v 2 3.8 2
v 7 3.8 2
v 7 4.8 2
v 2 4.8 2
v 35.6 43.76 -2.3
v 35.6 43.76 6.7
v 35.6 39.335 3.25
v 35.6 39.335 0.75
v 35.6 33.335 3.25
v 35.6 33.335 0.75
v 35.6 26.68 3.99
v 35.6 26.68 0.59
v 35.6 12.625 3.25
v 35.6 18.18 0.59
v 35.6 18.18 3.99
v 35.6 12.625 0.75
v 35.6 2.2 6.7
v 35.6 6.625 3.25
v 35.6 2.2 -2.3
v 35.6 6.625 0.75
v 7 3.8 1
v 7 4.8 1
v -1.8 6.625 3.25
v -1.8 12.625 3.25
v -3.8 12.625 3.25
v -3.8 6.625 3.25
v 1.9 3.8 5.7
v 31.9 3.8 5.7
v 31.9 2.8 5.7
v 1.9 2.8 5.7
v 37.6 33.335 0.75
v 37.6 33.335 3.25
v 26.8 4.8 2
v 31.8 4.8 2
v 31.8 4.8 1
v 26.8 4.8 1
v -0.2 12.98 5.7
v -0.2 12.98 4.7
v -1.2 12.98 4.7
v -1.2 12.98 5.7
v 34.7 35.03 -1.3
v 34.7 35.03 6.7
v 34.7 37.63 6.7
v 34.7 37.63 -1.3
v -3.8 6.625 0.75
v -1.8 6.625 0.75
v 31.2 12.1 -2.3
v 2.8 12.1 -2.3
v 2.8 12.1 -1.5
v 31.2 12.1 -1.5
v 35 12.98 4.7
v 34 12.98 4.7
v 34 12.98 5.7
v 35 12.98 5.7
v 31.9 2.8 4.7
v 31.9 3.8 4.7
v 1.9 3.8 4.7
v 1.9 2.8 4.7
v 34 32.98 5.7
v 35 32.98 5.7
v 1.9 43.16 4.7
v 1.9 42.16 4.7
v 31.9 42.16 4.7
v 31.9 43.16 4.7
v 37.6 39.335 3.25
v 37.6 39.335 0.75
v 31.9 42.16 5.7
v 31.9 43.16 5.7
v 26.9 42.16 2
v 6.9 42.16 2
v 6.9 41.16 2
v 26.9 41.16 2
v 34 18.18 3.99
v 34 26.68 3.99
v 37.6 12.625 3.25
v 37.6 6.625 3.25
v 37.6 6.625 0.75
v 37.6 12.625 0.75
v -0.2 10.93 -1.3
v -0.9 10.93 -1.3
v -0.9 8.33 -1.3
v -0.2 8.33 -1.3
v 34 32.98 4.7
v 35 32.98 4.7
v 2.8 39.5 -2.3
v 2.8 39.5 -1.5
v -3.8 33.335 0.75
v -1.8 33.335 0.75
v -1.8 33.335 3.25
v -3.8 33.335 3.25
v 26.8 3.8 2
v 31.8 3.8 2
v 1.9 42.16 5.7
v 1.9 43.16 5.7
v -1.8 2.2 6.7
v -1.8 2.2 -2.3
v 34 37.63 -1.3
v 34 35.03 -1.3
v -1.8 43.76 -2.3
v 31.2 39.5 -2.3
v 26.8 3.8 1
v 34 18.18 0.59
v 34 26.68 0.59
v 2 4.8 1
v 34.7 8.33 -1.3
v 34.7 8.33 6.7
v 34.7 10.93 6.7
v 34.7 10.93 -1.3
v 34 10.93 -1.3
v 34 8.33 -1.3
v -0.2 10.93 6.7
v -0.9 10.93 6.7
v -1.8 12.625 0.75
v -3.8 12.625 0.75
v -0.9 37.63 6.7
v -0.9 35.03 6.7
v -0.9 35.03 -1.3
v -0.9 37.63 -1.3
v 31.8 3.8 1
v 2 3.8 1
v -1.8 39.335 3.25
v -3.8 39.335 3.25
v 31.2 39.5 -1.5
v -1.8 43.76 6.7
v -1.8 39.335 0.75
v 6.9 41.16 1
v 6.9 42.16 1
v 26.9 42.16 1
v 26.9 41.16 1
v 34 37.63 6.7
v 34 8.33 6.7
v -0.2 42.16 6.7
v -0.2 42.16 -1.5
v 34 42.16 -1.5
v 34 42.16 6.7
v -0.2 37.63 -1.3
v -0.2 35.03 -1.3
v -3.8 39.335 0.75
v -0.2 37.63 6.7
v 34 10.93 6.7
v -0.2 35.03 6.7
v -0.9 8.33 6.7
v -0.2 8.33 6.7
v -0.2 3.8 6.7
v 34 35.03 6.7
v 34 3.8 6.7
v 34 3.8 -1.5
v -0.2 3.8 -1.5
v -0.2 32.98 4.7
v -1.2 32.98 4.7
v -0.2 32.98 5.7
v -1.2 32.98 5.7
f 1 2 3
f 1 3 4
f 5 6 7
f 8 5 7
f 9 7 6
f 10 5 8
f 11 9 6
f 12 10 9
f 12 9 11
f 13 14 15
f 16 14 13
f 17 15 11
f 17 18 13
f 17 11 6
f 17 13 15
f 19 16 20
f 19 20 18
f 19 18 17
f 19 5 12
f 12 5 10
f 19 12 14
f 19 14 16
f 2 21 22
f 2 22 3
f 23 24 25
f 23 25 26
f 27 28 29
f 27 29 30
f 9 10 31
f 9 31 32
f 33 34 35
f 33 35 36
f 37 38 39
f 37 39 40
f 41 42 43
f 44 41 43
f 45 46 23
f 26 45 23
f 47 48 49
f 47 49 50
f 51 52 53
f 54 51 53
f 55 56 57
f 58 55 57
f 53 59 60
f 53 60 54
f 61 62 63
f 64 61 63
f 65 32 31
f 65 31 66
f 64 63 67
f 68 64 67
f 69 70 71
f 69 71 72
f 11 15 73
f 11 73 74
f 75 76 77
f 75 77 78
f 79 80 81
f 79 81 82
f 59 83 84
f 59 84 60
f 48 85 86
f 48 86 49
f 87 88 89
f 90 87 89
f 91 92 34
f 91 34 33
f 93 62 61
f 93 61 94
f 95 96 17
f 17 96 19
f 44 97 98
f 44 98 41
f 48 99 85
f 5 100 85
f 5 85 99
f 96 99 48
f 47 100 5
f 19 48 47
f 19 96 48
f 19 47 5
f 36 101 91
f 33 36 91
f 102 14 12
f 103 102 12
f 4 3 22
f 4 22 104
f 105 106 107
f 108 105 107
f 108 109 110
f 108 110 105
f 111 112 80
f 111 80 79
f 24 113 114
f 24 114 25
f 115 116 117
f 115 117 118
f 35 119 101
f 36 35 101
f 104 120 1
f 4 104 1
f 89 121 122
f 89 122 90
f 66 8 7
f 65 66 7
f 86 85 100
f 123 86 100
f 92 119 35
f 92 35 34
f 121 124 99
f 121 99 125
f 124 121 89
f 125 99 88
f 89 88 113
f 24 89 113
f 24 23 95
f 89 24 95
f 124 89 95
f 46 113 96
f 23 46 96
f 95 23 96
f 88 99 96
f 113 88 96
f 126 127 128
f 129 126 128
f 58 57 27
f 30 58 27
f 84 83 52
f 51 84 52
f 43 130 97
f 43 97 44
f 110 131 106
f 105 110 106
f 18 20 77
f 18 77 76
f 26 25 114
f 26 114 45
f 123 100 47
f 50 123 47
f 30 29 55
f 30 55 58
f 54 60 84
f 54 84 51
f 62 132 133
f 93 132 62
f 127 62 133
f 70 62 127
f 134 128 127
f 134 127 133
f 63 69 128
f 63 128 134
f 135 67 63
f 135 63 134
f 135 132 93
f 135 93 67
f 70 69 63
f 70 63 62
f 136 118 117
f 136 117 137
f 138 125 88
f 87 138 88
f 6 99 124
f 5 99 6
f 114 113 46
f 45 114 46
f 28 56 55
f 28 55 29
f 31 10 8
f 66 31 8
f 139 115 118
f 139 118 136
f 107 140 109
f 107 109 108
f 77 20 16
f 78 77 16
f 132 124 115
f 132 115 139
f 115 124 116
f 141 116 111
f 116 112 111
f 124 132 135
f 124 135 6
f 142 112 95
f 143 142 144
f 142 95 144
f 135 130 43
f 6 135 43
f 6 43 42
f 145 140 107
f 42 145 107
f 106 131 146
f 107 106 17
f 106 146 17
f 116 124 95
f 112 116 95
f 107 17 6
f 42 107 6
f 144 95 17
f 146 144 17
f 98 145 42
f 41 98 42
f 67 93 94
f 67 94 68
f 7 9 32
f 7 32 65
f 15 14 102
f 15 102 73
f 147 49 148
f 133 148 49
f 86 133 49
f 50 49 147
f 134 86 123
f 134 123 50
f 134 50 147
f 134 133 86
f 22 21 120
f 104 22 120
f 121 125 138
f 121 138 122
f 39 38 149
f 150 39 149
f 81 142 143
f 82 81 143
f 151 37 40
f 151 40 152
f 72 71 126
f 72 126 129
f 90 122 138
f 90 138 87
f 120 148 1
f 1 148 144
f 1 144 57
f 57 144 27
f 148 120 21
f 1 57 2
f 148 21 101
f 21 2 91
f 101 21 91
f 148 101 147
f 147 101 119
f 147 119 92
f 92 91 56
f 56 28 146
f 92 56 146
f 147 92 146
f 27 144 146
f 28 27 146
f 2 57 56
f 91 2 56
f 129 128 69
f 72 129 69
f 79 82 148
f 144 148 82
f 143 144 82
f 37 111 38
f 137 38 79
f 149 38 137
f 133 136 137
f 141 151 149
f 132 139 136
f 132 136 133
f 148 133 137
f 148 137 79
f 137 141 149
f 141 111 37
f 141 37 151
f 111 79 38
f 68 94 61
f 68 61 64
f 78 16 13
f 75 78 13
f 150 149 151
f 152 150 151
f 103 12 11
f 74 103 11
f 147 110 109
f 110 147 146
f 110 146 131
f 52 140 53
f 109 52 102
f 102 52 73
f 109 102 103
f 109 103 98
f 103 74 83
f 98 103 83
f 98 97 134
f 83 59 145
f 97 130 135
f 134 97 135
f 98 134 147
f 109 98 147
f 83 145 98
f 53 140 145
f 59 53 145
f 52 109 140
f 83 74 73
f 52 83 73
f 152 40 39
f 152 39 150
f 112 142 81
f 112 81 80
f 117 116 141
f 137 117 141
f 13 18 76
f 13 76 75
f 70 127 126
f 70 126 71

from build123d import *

# Parameters (mm, degrees)
SKETCH030_W     = 37.4
SKETCH030_H     = 41.56
PAD023_DEPTH    = 9
SKETCH031_W     = 28.4
SKETCH031_H     = 27.4
POCKET016_DEPTH = 0.8
SKETCH032_W     = 34.2
SKETCH032_H     = 38.36
POCKET017_DEPTH = 8.2
SKETCH033_W     = 0.9
SKETCH033_H     = 2.6
POCKET018_DEPTH = 8
SKETCH034_W     = 8.5
SKETCH034_H     = 3.4
POCKET019_DEPTH = 5
SKETCH035_W     = 6
SKETCH035_H     = 2.5
PAD024_DEPTH    = 2
SKETCH036_W     = 6
SKETCH036_H     = 2.5
PAD025_DEPTH    = 2
SKETCH037_W     = 20
SKETCH037_H     = 1
PAD026_DEPTH    = 1
SKETCH038_W     = 5
SKETCH038_H     = 1
PAD027_DEPTH    = 1
SKETCH039_W     = 30
SKETCH039_H     = 1
POCKET020_DEPTH = 1
SKETCH040_W     = 30
SKETCH040_H     = 1
POCKET021_DEPTH = 1
SKETCH041_W     = 20
SKETCH041_H     = 1
POCKET022_DEPTH = 1
SKETCH042_W     = 20
SKETCH042_H     = 1
POCKET023_DEPTH = 1


with BuildPart() as part:
    # Sketch030 (on Face1 of ShapeBinder004) → Pad023 (new body)
    with BuildSketch(Plane(origin=(0, 0, -2.3), x_dir=(1, 0, 0), z_dir=(0, 0, -1))):
        with Locations((16.9, -22.98)):
            Rectangle(SKETCH030_W, SKETCH030_H)
    extrude(amount=-PAD023_DEPTH)

    # Sketch031 (on Face5 of Pad023) → Pocket016 (cut)
    with BuildSketch(Plane(origin=(0, 0, -2.3), x_dir=(1, 0, 0), z_dir=(0, 0, -1))):
        with Locations((17, -25.8)):
            Rectangle(SKETCH031_W, SKETCH031_H)
    extrude(amount=-POCKET016_DEPTH, mode=Mode.SUBTRACT)

    # Sketch032 (on Face5 of Pocket016) → Pocket017 (cut)
    with BuildSketch(Plane.XY.offset(6.7)):
        with Locations((16.9, 22.98)):
            Rectangle(SKETCH032_W, SKETCH032_H)
    extrude(amount=-POCKET017_DEPTH, mode=Mode.SUBTRACT)

    # Sketch033 (on Face5 of Pocket017) → Pocket018 (cut)
    with BuildSketch(Plane.XY.offset(6.7)):
        with Locations((34.25, 9.63)):
            Rectangle(SKETCH033_W, SKETCH033_H)
        with Locations((34.25, 36.33)):
            Rectangle(SKETCH033_W, SKETCH033_H)
        with Locations((-0.45, 9.63)):
            Rectangle(SKETCH033_W, SKETCH033_H)
        with Locations((-0.45, 36.33)):
            Rectangle(SKETCH033_W, SKETCH033_H)
    extrude(amount=-POCKET018_DEPTH, mode=Mode.SUBTRACT)

    # Sketch034 (on Face3 of Pocket018) → Pocket019 (cut)
    with BuildSketch(Plane(origin=(35.6, 0, -0.8), x_dir=(0, 1, 0), z_dir=(1, 0, 0))):
        with Locations((22.43, 3.09)):
            Rectangle(SKETCH034_W, SKETCH034_H)
    extrude(amount=-POCKET019_DEPTH, mode=Mode.SUBTRACT)

    # Sketch035 (on Face2 of Pocket019) → Pad024 (join)
    with BuildSketch(Plane(origin=(-1.8, 0, -0.8), x_dir=(0, -1, 0), z_dir=(-1, 0, 0))):
        with Locations((-9.625, 2.8)):
            Rectangle(SKETCH035_W, SKETCH035_H)
        with Locations((-36.335, 2.8)):
            Rectangle(SKETCH035_W, SKETCH035_H)
    extrude(amount=PAD024_DEPTH)

    # Sketch036 (on Face3 of Pad024) → Pad025 (join)
    with BuildSketch(Plane(origin=(35.6, 0, -0.8), x_dir=(0, 1, 0), z_dir=(1, 0, 0))):
        with Locations((9.625, 2.8)):
            Rectangle(SKETCH036_W, SKETCH036_H)
        with Locations((36.335, 2.8)):
            Rectangle(SKETCH036_W, SKETCH036_H)
    extrude(amount=PAD025_DEPTH)

    # Sketch037 (on Face39 of Pad025) → Pad026 (join)
    with BuildSketch(Plane(origin=(0, 42.16, -0.8), x_dir=(1, 0, 0), z_dir=(0, -1, 0))):
        with Locations((16.9, 2.3)):
            Rectangle(SKETCH037_W, SKETCH037_H)
    extrude(amount=PAD026_DEPTH)

    # Sketch038 (on Face31 of Pad026) → Pad027 (join)
    with BuildSketch(Plane(origin=(0, 3.8, -0.8), x_dir=(-1, 0, 0), z_dir=(0, 1, 0))):
        with Locations((-29.3, 2.3)):
            Rectangle(SKETCH038_W, SKETCH038_H)
        with Locations((-4.5, 2.3)):
            Rectangle(SKETCH038_W, SKETCH038_H)
    extrude(amount=PAD027_DEPTH)

    # Sketch039 (on Face39 of Pad027) → Pocket020 (cut)
    with BuildSketch(Plane(origin=(0, 42.16, -0.8), x_dir=(1, 0, 0), z_dir=(0, -1, 0))):
        with Locations((16.9, 6)):
            Rectangle(SKETCH039_W, SKETCH039_H)
    extrude(amount=-POCKET020_DEPTH, mode=Mode.SUBTRACT)

    # Sketch040 (on Face31 of Pocket020) → Pocket021 (cut)
    with BuildSketch(Plane(origin=(0, 3.8, -0.8), x_dir=(-1, 0, 0), z_dir=(0, 1, 0))):
        with Locations((-16.9, 6)):
            Rectangle(SKETCH040_W, SKETCH040_H)
    extrude(amount=-POCKET021_DEPTH, mode=Mode.SUBTRACT)

    # Sketch041 (on Face32 of Pocket021) → Pocket022 (cut)
    with BuildSketch(Plane(origin=(34, 0, -0.8), x_dir=(0, -1, 0), z_dir=(-1, 0, 0))):
        with Locations((-22.98, 6)):
            Rectangle(SKETCH041_W, SKETCH041_H)
    extrude(amount=-POCKET022_DEPTH, mode=Mode.SUBTRACT)

    # Sketch042 (on Face40 of Pocket022) → Pocket023 (cut)
    with BuildSketch(Plane(origin=(-0.2, 0, -0.8), x_dir=(0, 1, 0), z_dir=(1, 0, 0))):
        with Locations((22.98, 6)):
            Rectangle(SKETCH042_W, SKETCH042_H)
    extrude(amount=-POCKET023_DEPTH, mode=Mode.SUBTRACT)


solid = part.part
